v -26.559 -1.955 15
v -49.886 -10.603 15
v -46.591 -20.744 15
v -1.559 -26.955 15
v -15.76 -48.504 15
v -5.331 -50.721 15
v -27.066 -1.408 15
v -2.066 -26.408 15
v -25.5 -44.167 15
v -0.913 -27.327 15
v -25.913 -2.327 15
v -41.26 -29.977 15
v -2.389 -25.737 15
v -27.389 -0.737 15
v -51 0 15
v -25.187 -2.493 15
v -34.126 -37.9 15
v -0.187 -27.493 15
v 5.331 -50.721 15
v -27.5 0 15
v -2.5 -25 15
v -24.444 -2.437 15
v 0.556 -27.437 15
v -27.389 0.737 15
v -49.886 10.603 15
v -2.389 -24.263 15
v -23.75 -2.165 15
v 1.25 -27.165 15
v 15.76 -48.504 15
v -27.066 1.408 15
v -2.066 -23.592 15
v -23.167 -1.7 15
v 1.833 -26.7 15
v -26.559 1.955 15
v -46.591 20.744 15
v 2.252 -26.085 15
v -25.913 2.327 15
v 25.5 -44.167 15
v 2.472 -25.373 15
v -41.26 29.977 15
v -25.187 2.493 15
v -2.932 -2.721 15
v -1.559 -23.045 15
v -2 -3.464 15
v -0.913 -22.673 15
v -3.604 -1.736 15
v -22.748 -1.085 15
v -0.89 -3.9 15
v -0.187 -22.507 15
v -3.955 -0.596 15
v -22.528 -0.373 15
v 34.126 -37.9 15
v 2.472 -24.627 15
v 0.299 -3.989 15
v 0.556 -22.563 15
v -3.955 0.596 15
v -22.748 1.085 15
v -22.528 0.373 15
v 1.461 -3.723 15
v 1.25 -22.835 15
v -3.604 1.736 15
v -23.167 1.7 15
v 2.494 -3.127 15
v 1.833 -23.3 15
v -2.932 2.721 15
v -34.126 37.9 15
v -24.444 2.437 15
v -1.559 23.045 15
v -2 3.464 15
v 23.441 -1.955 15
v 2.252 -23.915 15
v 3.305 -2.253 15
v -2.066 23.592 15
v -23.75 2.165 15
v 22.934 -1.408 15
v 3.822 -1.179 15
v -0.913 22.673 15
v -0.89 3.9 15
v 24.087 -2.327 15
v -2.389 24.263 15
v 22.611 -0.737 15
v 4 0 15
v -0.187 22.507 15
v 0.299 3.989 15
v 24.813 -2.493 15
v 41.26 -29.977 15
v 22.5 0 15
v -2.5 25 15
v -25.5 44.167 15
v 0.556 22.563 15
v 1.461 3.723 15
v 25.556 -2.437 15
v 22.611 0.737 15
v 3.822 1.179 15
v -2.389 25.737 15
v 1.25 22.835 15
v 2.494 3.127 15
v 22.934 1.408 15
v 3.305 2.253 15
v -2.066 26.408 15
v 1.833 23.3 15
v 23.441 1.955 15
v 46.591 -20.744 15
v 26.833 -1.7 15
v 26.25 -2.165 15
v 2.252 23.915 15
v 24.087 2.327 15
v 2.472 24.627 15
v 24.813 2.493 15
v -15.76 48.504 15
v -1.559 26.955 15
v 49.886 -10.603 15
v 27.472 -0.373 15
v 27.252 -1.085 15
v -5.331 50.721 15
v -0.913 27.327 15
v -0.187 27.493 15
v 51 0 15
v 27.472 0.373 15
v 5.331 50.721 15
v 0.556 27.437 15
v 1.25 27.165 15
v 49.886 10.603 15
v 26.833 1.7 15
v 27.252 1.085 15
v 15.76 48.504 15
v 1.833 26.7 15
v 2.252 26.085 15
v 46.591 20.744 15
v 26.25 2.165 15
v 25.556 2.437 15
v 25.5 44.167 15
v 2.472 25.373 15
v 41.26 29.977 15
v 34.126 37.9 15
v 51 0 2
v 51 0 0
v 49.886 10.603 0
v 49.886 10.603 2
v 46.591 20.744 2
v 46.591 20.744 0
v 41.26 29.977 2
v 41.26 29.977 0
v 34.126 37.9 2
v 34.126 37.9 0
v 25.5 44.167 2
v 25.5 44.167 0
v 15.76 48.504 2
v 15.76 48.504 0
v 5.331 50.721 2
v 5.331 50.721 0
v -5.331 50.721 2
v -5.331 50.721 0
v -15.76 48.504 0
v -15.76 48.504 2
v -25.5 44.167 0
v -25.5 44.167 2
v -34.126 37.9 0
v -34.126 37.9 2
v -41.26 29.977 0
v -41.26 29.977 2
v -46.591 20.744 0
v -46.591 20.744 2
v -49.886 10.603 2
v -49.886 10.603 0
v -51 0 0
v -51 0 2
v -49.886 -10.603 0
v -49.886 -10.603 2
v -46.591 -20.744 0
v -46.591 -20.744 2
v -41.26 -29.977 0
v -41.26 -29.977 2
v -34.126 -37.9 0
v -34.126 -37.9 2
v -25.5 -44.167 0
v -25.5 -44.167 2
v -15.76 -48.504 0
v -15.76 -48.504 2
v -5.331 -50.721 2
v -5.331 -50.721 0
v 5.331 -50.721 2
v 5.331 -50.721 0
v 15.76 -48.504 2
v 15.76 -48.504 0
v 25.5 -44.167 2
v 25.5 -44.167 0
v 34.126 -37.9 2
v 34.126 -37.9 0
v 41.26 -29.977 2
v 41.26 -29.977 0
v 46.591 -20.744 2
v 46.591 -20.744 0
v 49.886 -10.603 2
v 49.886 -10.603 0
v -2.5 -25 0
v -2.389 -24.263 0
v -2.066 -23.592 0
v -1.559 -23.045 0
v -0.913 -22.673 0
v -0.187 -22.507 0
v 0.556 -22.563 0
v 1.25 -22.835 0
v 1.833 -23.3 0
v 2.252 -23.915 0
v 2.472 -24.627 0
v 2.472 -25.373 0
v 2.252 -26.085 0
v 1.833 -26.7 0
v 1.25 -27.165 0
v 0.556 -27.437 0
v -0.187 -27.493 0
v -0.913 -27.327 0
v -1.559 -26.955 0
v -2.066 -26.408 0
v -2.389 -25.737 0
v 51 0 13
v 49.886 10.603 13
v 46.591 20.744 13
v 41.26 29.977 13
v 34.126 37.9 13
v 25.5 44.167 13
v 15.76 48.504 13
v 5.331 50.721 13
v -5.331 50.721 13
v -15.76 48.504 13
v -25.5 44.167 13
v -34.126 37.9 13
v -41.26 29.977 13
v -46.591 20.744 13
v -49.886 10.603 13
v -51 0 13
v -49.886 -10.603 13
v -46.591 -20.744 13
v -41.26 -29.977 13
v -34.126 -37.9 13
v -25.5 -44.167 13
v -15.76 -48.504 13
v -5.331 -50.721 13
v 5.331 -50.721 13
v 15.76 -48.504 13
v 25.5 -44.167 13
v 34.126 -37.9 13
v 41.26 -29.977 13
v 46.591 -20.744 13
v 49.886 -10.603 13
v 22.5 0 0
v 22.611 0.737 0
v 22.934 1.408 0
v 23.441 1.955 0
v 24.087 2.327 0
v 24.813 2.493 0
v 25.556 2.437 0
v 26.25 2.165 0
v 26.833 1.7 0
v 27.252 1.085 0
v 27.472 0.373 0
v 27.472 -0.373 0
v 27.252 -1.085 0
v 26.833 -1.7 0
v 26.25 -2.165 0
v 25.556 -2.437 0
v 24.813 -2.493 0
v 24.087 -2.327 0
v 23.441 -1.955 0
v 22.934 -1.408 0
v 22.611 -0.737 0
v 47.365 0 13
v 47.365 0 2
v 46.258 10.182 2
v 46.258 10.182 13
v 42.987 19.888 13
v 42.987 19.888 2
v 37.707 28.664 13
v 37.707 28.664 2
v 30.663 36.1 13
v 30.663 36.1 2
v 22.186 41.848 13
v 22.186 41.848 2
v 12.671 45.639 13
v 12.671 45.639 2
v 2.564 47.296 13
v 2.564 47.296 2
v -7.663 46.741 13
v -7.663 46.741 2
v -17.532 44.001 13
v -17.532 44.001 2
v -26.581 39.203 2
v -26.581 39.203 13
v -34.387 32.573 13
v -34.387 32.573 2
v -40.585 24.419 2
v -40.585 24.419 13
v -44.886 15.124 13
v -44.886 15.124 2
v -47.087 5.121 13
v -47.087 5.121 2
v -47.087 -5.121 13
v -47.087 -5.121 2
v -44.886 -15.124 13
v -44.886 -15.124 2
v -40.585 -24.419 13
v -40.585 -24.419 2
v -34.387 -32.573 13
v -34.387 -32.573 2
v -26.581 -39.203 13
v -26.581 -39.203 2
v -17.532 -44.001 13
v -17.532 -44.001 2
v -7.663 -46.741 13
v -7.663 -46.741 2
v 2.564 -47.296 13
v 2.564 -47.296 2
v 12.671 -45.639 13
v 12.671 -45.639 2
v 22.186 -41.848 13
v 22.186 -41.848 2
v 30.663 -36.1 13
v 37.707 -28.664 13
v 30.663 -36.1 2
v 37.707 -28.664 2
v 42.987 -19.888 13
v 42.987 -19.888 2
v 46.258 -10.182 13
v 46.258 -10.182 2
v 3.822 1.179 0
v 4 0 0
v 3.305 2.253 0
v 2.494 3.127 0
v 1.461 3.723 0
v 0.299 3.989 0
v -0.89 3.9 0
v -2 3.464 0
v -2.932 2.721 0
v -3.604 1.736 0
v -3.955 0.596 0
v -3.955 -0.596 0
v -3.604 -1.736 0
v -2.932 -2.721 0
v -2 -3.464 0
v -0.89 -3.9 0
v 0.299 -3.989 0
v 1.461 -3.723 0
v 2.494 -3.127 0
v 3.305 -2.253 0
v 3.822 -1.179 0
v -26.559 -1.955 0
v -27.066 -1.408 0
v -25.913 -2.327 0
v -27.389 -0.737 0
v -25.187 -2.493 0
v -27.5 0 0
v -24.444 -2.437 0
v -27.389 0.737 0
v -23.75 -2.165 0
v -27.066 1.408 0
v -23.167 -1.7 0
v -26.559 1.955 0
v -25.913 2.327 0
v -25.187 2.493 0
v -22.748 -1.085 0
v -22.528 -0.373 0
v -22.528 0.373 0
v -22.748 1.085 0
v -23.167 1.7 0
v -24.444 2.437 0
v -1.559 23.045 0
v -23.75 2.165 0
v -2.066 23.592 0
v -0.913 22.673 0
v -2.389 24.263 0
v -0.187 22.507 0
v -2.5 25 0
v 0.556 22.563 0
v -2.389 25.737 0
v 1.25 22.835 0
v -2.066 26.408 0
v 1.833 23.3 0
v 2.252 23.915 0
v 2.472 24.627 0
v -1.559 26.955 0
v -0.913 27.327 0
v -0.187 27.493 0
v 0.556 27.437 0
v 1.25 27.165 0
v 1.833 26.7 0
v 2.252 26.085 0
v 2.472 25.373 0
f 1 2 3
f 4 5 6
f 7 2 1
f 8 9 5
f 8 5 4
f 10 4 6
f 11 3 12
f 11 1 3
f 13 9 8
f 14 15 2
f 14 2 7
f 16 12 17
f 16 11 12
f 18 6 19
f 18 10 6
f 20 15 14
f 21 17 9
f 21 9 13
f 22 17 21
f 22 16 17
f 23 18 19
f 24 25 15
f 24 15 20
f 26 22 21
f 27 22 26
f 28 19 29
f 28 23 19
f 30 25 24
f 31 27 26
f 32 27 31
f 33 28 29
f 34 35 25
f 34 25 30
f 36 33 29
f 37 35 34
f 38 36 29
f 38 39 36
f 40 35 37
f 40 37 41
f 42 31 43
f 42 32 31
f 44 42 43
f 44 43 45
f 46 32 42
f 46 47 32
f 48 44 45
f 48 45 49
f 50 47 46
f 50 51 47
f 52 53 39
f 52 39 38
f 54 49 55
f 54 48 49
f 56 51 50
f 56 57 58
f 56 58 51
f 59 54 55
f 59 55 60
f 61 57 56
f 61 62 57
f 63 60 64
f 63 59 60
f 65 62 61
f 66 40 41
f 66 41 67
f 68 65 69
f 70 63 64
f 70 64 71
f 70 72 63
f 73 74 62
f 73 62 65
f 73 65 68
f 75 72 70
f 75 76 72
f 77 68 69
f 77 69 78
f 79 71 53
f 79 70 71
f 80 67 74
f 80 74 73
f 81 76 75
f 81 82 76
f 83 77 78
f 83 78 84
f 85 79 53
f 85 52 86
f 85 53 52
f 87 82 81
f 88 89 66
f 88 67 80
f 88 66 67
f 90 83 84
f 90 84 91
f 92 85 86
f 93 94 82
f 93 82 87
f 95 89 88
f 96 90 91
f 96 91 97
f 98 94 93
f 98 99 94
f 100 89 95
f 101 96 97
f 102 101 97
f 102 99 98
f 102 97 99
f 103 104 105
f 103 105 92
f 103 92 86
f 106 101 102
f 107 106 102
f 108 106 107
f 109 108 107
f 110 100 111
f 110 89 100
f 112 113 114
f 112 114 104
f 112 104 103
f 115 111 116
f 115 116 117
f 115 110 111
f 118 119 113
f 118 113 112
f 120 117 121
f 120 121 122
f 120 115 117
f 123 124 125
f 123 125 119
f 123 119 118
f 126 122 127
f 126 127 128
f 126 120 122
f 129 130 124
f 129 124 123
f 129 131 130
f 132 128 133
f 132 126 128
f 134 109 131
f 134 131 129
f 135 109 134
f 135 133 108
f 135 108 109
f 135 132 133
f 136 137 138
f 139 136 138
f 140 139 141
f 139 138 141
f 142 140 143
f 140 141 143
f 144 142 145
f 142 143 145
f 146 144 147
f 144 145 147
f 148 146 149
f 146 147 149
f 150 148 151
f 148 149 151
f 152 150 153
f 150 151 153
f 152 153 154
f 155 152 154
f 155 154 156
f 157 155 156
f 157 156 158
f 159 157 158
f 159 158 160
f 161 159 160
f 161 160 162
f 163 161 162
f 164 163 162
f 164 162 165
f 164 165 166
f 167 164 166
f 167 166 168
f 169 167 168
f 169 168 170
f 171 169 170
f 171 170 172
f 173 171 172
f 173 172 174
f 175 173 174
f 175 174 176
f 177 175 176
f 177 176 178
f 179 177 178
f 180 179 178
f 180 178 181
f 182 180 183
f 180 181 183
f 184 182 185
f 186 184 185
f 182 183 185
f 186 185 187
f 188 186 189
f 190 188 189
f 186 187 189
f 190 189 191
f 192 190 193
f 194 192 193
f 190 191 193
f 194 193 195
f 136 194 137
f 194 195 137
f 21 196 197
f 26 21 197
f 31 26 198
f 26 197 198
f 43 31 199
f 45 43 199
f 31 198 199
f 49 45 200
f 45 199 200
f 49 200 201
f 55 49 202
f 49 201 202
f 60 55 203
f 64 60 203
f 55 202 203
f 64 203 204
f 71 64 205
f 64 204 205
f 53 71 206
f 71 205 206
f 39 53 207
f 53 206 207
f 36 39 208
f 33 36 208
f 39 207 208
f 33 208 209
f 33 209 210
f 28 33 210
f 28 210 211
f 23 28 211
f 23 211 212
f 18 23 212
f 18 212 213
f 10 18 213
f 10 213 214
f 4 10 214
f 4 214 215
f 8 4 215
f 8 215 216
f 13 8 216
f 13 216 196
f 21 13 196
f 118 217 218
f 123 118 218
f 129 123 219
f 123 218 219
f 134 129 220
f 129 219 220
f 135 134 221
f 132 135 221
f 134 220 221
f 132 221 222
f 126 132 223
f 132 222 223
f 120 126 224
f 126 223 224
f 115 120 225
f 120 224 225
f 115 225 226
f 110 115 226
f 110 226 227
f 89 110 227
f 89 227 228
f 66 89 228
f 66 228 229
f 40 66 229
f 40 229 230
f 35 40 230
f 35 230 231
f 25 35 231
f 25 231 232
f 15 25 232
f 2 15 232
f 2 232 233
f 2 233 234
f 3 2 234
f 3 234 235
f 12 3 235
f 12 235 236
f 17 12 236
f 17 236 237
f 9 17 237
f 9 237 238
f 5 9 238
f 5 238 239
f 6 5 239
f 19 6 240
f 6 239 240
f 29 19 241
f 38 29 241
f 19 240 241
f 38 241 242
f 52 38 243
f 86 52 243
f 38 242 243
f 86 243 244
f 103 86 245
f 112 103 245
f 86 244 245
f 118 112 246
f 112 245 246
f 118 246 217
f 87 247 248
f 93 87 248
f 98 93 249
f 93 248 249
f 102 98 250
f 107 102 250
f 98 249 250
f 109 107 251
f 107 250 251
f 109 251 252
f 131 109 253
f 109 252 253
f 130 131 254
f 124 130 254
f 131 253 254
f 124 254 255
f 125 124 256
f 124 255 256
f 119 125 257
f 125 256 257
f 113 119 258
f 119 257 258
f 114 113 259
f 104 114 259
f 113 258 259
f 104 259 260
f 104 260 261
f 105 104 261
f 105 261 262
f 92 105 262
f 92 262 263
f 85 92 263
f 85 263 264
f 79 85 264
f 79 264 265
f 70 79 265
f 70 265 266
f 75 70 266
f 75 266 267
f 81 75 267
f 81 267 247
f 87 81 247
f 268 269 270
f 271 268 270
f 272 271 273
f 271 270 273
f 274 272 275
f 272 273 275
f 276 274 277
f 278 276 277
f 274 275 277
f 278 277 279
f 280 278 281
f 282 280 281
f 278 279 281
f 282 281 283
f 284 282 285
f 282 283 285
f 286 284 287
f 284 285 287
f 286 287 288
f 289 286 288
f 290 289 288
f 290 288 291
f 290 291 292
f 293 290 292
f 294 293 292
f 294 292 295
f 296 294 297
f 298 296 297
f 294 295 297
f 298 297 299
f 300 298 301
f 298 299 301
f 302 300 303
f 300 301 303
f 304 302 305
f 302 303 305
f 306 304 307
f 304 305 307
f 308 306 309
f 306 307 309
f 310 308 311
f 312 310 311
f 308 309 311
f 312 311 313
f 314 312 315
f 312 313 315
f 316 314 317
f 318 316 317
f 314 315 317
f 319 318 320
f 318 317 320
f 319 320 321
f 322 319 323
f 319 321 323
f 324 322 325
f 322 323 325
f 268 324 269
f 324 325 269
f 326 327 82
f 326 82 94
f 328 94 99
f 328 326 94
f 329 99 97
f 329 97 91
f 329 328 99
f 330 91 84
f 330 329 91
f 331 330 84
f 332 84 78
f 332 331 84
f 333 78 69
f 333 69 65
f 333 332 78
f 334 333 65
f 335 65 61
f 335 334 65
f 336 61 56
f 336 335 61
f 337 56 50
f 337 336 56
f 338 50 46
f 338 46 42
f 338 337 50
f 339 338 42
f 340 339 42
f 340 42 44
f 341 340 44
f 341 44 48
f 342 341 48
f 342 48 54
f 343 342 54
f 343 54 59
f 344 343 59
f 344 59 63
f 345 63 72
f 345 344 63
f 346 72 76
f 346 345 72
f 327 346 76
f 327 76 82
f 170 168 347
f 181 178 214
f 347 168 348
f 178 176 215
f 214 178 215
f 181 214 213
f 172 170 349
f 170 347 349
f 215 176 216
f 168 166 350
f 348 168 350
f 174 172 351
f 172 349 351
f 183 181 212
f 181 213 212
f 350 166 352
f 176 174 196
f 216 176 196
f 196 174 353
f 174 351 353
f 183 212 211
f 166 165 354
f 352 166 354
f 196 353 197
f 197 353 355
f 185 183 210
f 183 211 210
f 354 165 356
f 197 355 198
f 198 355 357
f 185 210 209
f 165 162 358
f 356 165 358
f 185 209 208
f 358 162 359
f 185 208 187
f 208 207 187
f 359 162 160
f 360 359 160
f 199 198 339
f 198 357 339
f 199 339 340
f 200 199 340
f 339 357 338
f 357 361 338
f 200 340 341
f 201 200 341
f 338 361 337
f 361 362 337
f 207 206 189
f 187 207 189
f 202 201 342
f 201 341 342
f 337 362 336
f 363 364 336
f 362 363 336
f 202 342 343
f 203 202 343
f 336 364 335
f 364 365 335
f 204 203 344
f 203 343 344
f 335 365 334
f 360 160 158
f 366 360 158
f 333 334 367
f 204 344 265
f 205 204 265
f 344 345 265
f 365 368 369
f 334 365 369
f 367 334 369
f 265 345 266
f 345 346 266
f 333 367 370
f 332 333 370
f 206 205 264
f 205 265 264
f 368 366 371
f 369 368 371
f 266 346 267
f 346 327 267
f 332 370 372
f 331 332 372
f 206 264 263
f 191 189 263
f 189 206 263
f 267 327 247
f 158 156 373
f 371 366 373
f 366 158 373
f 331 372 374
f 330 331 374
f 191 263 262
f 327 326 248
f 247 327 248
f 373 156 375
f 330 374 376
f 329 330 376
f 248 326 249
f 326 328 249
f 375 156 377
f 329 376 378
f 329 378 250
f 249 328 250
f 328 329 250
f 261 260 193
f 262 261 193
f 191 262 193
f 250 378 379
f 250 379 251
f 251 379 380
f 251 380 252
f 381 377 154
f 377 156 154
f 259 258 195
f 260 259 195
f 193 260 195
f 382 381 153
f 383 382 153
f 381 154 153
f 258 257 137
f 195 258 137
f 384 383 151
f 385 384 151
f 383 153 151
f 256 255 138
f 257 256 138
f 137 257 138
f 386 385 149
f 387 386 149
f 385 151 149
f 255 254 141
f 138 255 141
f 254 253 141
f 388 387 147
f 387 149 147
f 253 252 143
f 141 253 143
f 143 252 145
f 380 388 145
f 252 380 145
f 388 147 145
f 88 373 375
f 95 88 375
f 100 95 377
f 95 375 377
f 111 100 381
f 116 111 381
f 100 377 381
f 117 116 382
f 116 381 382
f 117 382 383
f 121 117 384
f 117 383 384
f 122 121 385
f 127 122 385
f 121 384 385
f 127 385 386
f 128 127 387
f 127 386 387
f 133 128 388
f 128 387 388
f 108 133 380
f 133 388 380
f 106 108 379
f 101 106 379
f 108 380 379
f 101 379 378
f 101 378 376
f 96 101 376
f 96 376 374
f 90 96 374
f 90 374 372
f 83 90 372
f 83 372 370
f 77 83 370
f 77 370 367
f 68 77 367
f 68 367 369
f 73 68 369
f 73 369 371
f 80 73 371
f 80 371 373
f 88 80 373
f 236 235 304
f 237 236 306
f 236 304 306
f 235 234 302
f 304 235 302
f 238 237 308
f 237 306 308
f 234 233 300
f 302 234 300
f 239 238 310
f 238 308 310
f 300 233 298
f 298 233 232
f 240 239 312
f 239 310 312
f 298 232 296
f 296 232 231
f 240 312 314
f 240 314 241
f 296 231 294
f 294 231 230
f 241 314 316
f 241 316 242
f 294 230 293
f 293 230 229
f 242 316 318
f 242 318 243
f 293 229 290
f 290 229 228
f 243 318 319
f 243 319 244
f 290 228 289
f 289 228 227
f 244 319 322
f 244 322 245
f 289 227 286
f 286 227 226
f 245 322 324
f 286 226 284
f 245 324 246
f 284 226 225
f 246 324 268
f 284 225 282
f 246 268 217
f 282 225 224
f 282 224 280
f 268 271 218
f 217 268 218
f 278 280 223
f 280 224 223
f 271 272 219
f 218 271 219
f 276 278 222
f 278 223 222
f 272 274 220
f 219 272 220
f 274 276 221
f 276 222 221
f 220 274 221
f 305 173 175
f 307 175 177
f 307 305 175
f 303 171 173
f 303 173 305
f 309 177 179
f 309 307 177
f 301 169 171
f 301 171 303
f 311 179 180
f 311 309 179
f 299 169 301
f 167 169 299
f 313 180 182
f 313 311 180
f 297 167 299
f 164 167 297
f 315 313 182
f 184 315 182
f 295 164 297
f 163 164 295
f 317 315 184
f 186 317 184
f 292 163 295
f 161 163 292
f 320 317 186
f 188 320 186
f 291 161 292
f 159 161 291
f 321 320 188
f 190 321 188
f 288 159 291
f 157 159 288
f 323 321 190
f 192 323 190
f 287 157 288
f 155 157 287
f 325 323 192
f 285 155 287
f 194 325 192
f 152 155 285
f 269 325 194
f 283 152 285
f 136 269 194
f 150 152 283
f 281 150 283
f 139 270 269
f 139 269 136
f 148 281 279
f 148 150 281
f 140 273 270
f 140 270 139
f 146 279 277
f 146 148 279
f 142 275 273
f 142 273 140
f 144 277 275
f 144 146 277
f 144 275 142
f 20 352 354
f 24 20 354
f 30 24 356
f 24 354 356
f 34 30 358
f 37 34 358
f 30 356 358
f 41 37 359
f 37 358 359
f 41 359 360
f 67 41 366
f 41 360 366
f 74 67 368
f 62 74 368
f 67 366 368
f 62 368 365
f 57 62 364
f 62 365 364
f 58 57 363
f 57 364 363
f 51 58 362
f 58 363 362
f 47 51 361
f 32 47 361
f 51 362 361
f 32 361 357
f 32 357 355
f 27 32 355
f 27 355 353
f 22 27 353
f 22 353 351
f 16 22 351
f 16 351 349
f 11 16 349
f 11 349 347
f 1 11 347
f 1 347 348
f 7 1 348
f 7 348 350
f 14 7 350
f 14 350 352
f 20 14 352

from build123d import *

# Parameters (mm, degrees)
SKETCH_1_R            = 51
SKETCH_1_R_2          = 4
EXTRUDE_1_DEPTH       = 15
HOLE_WIZARD_5_0_5_1_D = 5
CUT_EXTRUDE_START     = -13
SKETCH_4_R            = 51
SKETCH_4_R_2          = 47.365
CUT_EXTRUDE_2_DEPTH   = 11


with BuildPart() as part:
    # 草图1 → 凸台-拉伸1 (new body)
    with BuildSketch(Plane.XY):
        Circle(SKETCH_1_R)
        Circle(SKETCH_1_R_2, mode=Mode.SUBTRACT)
    extrude(amount=EXTRUDE_1_DEPTH)

    # Ø5.0 (5) 直径孔1 (through all)
    with Locations(Plane.XY.offset(15)):
        with Locations((25, 0), (0, 25), (-25, 0), (0, -25)):
            Hole(HOLE_WIZARD_5_0_5_1_D / 2)

    # 草图4 → 切除-拉伸2 (cut)
    with BuildSketch(Plane.XY.offset(15).offset(CUT_EXTRUDE_START)):
        Circle(SKETCH_4_R)
        Circle(SKETCH_4_R_2, mode=Mode.SUBTRACT)
    extrude(amount=CUT_EXTRUDE_2_DEPTH, mode=Mode.SUBTRACT)


solid = part.part
